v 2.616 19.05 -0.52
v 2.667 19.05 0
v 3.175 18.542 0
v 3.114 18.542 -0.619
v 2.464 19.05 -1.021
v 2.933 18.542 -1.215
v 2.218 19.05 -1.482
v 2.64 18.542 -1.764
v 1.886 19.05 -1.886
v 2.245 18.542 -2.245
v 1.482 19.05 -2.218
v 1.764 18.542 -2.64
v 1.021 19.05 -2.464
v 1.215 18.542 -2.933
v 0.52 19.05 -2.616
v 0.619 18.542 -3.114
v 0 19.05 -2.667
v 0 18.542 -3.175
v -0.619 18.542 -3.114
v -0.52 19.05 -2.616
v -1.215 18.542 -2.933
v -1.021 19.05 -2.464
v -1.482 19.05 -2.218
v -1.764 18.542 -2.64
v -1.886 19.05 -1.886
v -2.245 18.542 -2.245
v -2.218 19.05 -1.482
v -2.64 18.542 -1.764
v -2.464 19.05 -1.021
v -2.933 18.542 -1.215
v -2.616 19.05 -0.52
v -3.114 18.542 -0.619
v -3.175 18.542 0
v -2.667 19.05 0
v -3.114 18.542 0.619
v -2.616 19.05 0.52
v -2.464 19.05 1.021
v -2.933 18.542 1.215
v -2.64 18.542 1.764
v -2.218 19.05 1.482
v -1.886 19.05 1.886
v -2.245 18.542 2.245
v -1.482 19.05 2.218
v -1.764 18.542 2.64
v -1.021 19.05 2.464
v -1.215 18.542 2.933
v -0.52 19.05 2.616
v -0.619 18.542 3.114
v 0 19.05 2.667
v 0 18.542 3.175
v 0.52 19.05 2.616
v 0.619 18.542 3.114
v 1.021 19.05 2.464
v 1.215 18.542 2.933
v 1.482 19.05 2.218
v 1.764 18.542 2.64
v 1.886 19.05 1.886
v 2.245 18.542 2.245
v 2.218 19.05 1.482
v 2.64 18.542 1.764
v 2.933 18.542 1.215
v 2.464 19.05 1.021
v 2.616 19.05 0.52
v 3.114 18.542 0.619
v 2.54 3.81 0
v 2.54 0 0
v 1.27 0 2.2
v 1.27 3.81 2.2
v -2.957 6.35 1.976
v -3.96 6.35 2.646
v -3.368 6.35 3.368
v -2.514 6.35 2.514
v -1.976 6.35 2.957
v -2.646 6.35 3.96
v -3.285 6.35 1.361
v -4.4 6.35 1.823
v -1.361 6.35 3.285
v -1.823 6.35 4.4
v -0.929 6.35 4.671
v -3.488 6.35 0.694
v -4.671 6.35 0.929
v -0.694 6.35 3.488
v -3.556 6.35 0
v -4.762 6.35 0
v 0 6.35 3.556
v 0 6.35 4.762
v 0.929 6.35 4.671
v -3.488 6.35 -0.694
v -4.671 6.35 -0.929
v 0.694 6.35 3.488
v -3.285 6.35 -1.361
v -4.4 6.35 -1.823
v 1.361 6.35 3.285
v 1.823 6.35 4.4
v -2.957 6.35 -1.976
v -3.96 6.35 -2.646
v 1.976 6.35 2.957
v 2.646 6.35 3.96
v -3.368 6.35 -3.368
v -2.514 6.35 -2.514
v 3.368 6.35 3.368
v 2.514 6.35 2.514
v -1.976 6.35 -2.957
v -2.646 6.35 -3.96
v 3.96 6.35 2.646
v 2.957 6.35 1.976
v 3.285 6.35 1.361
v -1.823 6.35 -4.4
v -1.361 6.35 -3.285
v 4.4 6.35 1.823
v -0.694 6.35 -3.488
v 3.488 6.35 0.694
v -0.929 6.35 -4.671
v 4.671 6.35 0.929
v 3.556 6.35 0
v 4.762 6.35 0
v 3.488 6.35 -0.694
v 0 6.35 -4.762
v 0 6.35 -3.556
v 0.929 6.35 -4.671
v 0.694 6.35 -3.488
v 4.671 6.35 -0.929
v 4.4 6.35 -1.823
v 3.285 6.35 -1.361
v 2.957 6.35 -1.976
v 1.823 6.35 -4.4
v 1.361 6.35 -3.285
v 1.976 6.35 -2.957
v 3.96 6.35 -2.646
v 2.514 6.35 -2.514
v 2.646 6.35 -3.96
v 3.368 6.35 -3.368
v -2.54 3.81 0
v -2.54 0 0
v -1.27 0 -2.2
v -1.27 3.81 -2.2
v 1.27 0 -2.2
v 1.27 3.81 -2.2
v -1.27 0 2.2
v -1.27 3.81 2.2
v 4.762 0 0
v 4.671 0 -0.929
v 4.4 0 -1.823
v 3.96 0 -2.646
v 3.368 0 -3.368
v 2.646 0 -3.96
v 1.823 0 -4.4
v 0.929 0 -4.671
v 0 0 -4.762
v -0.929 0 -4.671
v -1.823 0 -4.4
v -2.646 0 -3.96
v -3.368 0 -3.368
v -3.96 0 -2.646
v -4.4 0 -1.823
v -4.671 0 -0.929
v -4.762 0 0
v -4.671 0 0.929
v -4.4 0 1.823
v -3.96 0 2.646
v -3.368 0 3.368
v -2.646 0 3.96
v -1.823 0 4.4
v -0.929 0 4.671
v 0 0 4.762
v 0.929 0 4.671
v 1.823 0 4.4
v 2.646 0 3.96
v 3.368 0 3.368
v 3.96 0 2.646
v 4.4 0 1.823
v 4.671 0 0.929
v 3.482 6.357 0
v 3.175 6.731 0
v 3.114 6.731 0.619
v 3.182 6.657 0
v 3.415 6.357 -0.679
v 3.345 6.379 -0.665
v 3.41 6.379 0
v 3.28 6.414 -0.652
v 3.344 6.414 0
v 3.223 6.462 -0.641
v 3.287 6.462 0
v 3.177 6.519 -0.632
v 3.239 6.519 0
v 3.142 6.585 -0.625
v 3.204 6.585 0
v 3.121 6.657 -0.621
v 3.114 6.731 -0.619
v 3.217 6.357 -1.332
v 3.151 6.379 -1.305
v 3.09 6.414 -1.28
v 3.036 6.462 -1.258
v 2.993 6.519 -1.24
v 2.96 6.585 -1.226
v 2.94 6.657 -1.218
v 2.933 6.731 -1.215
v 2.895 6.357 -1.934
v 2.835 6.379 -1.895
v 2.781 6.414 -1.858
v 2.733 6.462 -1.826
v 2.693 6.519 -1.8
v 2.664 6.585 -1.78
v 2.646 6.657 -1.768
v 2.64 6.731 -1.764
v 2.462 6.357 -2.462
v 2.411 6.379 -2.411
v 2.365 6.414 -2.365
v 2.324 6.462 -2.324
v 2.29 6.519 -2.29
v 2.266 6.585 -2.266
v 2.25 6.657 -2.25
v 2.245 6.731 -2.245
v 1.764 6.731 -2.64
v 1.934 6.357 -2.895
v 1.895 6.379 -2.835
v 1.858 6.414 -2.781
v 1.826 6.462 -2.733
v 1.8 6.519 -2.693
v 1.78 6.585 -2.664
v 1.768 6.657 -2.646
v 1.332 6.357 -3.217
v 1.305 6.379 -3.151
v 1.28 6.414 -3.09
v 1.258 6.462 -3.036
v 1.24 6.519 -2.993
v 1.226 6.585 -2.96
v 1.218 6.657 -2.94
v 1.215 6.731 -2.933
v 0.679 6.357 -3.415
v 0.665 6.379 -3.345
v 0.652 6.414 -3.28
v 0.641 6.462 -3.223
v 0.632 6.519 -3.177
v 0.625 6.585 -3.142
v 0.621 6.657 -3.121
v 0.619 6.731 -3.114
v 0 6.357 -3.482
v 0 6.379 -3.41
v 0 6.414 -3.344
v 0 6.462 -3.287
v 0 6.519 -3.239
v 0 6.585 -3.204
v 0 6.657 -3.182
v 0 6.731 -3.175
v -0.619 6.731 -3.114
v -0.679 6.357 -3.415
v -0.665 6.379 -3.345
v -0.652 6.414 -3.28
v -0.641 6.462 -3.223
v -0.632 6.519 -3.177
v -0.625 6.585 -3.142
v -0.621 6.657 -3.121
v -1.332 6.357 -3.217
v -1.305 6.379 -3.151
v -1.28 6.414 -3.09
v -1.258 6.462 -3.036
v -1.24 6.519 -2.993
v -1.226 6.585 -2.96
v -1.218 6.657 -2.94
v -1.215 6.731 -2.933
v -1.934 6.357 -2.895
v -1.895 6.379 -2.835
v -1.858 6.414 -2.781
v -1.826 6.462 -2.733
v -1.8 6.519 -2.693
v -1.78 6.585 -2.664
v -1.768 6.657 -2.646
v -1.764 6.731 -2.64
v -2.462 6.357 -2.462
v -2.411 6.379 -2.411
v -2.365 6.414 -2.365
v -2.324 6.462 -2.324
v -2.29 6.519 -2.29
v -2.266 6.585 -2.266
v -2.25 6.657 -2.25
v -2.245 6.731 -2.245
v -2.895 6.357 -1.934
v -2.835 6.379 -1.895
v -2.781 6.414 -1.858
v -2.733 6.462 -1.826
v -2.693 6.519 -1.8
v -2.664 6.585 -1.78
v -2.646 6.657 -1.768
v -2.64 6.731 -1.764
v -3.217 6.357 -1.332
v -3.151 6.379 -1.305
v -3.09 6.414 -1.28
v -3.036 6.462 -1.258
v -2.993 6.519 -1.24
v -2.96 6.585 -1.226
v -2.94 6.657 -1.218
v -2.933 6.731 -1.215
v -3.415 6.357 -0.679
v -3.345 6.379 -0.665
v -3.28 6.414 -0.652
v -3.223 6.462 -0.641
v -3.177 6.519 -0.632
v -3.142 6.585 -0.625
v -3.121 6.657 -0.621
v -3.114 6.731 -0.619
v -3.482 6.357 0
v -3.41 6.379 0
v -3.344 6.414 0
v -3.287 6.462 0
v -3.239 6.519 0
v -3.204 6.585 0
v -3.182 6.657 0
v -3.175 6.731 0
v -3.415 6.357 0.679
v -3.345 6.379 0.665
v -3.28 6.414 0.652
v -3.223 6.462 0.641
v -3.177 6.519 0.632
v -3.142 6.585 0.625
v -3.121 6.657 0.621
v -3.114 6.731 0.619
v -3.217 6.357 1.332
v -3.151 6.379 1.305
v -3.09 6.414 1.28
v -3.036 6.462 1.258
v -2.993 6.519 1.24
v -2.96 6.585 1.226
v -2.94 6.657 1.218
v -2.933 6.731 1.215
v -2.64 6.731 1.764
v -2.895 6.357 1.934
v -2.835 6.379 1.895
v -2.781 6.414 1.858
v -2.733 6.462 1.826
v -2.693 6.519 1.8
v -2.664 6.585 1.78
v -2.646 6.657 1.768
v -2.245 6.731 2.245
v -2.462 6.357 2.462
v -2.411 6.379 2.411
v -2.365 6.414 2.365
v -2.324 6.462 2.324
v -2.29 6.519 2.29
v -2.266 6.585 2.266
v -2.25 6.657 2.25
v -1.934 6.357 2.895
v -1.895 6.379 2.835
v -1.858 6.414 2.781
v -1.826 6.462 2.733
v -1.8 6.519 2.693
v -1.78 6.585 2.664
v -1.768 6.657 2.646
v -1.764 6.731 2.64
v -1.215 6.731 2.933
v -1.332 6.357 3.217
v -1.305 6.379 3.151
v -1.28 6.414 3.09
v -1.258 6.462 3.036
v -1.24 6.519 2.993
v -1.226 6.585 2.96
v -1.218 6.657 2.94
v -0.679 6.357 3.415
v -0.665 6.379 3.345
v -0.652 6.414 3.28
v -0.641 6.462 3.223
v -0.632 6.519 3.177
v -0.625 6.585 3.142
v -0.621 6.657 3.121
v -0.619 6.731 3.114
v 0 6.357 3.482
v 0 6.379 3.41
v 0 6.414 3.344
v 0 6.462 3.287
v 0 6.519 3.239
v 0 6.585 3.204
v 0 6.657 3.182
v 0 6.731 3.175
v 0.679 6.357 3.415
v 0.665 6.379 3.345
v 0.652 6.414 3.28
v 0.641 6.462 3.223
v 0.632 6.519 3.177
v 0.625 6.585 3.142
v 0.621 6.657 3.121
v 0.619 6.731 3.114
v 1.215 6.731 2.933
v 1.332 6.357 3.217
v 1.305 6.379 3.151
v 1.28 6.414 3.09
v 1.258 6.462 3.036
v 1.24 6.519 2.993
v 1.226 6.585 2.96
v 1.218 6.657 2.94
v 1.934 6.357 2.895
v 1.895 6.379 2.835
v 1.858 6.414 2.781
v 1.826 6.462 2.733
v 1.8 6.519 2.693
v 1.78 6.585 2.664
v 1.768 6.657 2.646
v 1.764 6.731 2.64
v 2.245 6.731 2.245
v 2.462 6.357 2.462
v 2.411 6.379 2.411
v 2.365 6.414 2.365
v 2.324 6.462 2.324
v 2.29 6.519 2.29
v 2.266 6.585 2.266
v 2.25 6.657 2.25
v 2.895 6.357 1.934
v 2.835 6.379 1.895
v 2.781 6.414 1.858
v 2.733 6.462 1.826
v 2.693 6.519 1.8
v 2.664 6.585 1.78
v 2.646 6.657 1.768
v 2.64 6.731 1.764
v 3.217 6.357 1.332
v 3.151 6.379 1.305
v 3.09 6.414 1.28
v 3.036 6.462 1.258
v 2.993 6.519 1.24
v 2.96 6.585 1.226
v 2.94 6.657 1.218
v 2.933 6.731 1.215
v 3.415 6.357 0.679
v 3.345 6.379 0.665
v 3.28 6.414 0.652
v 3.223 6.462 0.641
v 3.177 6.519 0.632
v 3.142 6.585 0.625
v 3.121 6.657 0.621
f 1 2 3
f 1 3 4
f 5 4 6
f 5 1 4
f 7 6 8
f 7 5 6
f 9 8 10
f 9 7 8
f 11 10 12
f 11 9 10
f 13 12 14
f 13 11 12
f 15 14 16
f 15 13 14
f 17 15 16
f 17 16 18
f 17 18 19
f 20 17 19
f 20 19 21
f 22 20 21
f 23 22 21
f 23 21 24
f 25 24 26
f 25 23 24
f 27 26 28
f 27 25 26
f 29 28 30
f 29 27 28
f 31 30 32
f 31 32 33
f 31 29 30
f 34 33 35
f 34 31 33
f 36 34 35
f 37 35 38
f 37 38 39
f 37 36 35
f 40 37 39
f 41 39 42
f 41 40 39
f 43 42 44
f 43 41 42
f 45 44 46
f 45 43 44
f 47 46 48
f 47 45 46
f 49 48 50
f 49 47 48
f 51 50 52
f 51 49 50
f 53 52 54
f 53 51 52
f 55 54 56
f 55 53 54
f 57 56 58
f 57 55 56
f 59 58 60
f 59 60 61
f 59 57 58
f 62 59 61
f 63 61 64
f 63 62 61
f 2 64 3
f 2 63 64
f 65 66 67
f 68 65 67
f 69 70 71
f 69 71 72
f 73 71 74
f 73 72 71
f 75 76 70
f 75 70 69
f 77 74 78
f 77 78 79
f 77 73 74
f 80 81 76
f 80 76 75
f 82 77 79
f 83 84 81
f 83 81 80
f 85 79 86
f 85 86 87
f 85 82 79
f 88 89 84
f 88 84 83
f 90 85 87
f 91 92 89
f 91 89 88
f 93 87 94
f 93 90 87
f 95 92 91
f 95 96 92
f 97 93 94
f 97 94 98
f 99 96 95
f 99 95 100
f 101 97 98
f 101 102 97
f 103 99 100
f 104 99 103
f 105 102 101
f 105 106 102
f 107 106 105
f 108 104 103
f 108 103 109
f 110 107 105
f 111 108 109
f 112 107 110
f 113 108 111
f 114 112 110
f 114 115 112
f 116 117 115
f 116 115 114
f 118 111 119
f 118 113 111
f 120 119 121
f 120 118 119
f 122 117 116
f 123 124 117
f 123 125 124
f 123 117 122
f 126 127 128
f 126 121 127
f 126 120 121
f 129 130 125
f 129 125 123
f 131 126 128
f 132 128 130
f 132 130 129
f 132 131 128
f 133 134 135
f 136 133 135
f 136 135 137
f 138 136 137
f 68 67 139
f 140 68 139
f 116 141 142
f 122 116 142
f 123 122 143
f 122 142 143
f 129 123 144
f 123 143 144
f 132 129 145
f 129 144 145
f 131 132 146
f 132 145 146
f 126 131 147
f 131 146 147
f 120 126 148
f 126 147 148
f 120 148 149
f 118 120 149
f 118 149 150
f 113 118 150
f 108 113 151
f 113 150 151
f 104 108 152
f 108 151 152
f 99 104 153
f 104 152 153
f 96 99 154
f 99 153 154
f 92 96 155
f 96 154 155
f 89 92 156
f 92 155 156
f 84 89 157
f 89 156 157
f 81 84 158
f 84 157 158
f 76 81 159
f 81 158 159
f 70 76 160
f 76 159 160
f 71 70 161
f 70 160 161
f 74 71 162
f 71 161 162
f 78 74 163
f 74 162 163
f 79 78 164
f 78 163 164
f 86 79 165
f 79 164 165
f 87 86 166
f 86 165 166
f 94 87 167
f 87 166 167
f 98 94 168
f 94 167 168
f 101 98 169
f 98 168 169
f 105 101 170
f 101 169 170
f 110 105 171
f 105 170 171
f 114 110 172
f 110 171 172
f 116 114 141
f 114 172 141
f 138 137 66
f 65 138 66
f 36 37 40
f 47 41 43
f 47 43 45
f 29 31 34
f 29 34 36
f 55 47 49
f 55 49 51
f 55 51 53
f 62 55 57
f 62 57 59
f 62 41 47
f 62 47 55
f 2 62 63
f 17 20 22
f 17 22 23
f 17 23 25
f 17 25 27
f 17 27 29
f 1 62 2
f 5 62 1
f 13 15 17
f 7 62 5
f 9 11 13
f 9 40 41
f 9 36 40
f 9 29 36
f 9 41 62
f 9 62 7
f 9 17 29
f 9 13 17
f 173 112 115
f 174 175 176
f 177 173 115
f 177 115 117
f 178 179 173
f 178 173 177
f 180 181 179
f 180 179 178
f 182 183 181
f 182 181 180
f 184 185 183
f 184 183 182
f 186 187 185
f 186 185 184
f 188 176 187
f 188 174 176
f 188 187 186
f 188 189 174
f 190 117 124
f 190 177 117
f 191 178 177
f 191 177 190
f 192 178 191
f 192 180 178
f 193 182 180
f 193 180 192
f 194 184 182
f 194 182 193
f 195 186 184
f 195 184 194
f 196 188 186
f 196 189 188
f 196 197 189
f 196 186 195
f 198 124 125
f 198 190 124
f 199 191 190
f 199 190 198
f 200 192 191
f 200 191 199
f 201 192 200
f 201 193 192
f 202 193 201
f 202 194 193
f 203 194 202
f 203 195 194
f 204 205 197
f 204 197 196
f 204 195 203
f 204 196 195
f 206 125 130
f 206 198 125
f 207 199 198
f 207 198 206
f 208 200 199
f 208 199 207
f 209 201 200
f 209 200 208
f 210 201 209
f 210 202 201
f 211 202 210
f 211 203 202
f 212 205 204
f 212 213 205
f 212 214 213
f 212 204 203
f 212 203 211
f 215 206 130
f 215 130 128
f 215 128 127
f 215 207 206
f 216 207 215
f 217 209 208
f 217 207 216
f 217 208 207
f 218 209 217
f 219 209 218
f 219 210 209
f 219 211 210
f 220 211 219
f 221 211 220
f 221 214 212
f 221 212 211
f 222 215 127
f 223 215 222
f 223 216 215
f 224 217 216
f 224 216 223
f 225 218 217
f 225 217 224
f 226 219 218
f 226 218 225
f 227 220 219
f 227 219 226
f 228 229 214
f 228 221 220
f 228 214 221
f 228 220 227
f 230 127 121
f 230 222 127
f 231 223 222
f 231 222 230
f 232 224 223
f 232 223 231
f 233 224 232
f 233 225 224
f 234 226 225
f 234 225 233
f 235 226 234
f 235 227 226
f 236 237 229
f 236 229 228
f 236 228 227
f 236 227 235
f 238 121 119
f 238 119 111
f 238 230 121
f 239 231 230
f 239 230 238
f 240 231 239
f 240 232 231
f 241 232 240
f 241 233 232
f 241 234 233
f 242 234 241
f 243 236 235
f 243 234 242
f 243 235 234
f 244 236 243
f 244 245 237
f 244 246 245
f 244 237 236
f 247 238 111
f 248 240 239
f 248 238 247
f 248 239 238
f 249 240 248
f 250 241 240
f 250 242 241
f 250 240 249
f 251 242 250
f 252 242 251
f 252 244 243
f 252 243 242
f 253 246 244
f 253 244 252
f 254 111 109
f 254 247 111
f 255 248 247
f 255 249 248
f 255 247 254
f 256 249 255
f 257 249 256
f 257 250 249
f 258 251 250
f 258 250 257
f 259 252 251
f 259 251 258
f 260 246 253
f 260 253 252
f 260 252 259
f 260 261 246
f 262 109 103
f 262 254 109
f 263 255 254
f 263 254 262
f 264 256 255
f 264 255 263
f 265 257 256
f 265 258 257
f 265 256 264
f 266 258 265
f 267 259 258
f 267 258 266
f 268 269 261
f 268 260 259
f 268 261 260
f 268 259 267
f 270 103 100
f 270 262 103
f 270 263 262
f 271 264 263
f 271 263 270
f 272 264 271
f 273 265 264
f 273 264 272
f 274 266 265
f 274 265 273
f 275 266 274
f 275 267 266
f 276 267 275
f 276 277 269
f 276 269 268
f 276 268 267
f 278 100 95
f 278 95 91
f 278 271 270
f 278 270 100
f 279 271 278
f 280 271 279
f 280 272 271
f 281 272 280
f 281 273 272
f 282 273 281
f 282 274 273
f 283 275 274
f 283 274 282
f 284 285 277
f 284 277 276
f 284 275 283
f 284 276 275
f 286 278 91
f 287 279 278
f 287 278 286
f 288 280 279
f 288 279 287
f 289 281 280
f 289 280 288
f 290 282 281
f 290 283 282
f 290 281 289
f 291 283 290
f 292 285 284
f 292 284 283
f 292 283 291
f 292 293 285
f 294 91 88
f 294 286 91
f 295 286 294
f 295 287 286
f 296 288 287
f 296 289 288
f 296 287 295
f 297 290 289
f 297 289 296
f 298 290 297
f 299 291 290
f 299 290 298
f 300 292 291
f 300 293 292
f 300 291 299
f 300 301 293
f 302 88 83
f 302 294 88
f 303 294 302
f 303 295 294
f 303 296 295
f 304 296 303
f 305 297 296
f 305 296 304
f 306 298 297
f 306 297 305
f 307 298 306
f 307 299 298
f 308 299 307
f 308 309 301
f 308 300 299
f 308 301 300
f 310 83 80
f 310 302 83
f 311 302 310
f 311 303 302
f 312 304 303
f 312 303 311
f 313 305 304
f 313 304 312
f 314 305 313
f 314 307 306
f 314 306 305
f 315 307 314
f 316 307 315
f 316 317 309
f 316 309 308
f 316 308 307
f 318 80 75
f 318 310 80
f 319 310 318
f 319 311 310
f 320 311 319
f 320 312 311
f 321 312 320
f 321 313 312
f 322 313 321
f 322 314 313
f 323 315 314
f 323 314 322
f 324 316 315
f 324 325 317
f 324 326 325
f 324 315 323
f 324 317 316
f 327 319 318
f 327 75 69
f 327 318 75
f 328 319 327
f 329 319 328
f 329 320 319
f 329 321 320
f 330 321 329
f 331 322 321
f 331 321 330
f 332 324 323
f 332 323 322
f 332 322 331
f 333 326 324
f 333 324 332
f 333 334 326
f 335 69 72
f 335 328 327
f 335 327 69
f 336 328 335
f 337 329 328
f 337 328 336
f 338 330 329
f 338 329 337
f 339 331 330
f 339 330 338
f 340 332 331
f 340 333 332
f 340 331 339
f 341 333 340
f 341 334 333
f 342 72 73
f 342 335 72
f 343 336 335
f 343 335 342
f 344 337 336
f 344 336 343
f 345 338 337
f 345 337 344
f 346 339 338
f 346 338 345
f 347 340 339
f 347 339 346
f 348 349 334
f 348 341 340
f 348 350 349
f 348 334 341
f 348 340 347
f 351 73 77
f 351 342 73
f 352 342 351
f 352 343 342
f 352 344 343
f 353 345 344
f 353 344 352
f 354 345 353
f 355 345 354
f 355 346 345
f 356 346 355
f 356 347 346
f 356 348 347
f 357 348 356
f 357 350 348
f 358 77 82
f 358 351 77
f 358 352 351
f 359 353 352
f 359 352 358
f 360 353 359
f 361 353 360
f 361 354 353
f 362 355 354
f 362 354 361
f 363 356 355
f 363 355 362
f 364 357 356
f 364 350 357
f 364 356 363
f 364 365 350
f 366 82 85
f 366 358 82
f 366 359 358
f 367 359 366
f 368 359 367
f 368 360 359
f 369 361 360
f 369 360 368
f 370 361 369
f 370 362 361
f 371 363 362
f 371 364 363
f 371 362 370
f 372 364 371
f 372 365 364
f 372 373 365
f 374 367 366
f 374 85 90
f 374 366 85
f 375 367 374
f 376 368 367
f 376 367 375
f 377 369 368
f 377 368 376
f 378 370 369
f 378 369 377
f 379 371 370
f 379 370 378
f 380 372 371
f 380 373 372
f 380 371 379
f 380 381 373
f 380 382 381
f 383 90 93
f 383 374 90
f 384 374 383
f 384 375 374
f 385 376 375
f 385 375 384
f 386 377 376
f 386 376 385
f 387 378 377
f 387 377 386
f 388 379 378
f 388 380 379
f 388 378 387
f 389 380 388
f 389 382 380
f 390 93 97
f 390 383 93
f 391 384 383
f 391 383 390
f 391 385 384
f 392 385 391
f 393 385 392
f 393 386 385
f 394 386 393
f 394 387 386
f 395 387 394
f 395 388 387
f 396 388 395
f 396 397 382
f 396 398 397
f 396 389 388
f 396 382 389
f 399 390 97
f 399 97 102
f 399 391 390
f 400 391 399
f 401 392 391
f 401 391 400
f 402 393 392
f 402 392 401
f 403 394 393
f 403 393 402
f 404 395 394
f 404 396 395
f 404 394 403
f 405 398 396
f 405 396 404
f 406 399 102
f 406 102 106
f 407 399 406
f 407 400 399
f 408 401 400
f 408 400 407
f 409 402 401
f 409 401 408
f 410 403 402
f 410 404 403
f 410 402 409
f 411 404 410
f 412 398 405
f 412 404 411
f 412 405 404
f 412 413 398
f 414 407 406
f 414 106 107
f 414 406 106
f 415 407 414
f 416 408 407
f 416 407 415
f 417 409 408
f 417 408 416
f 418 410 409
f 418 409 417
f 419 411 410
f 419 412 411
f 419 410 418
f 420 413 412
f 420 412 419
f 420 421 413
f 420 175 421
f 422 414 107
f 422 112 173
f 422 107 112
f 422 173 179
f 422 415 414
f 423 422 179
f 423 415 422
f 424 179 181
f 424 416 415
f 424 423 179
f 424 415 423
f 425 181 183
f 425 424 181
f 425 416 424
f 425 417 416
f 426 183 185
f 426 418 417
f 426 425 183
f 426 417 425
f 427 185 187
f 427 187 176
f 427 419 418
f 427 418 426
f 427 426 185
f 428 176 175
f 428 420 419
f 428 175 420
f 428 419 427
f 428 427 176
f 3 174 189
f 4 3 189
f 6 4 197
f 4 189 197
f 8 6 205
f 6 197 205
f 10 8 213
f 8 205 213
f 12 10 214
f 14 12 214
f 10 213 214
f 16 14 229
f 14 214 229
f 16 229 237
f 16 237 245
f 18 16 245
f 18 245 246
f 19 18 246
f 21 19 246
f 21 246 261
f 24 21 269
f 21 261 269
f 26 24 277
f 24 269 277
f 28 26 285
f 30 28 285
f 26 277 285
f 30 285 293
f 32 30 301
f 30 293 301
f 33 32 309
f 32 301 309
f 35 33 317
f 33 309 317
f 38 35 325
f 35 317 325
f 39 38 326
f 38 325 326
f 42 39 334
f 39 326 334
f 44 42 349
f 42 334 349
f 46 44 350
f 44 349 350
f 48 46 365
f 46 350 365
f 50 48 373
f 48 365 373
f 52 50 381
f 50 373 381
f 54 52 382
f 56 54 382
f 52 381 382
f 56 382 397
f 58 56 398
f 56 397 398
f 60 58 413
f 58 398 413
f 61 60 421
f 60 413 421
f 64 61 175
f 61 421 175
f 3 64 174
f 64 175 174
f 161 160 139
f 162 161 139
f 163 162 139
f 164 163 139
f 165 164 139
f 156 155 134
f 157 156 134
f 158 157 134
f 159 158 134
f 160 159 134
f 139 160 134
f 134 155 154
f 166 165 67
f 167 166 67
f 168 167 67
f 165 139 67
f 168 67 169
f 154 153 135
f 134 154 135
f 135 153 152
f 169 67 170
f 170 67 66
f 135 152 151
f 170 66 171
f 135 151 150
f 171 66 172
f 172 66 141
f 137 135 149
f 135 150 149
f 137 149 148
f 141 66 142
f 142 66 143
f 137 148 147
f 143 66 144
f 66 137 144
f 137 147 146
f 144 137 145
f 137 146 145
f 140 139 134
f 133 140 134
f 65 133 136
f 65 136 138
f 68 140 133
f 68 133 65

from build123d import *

# Parameters (mm, degrees)
SKETCH2_R           = 4.7625
BOSS_EXTRUDE1_DEPTH = 6.35
CUT_EXTRUDE1_DEPTH  = 3.81
SKETCH4_R           = 3.175
BOSS_EXTRUDE5_DEPTH = 12.7
FILLET2_R           = 0.381
CHAMFER1_SIZE       = 0.508


with BuildPart() as part:
    # Sketch2 → Boss-Extrude1 (new body)
    with BuildSketch(Plane(origin=(0, 0, 0), x_dir=(1, 0, 0), z_dir=(0, 1, 0))):
        Circle(SKETCH2_R)
    extrude(amount=BOSS_EXTRUDE1_DEPTH)

    # Sketch3 → Cut-Extrude1 (cut)
    with BuildSketch(Plane.XZ):
        Polygon((2.54, 0), (1.27, 2.199704526), (-1.27, 2.199704526), (-2.54, 0), (-1.27, -2.199704526), (1.27, -2.199704526), align=None)
    extrude(amount=-CUT_EXTRUDE1_DEPTH, mode=Mode.SUBTRACT)

    # Sketch4 → Boss-Extrude5 (add)
    with BuildSketch(Plane(origin=(0, 6.35, 0), x_dir=(1, 0, 0), z_dir=(0, 1, 0))):
        Circle(SKETCH4_R)
    extrude(amount=BOSS_EXTRUDE5_DEPTH)

    # Fillet2
    fillet2_edges = [part.edges().sort_by_distance(p)[0] for p in [
        (-3.175, 6.35, 0),
    ]]
    fillet(fillet2_edges, radius=FILLET2_R)

    # Chamfer1
    chamfer1_edges = [part.edges().sort_by_distance(p)[0] for p in [
        (-3.175, 19.05, 0),
    ]]
    chamfer(chamfer1_edges, length=CHAMFER1_SIZE)


solid = part.part
